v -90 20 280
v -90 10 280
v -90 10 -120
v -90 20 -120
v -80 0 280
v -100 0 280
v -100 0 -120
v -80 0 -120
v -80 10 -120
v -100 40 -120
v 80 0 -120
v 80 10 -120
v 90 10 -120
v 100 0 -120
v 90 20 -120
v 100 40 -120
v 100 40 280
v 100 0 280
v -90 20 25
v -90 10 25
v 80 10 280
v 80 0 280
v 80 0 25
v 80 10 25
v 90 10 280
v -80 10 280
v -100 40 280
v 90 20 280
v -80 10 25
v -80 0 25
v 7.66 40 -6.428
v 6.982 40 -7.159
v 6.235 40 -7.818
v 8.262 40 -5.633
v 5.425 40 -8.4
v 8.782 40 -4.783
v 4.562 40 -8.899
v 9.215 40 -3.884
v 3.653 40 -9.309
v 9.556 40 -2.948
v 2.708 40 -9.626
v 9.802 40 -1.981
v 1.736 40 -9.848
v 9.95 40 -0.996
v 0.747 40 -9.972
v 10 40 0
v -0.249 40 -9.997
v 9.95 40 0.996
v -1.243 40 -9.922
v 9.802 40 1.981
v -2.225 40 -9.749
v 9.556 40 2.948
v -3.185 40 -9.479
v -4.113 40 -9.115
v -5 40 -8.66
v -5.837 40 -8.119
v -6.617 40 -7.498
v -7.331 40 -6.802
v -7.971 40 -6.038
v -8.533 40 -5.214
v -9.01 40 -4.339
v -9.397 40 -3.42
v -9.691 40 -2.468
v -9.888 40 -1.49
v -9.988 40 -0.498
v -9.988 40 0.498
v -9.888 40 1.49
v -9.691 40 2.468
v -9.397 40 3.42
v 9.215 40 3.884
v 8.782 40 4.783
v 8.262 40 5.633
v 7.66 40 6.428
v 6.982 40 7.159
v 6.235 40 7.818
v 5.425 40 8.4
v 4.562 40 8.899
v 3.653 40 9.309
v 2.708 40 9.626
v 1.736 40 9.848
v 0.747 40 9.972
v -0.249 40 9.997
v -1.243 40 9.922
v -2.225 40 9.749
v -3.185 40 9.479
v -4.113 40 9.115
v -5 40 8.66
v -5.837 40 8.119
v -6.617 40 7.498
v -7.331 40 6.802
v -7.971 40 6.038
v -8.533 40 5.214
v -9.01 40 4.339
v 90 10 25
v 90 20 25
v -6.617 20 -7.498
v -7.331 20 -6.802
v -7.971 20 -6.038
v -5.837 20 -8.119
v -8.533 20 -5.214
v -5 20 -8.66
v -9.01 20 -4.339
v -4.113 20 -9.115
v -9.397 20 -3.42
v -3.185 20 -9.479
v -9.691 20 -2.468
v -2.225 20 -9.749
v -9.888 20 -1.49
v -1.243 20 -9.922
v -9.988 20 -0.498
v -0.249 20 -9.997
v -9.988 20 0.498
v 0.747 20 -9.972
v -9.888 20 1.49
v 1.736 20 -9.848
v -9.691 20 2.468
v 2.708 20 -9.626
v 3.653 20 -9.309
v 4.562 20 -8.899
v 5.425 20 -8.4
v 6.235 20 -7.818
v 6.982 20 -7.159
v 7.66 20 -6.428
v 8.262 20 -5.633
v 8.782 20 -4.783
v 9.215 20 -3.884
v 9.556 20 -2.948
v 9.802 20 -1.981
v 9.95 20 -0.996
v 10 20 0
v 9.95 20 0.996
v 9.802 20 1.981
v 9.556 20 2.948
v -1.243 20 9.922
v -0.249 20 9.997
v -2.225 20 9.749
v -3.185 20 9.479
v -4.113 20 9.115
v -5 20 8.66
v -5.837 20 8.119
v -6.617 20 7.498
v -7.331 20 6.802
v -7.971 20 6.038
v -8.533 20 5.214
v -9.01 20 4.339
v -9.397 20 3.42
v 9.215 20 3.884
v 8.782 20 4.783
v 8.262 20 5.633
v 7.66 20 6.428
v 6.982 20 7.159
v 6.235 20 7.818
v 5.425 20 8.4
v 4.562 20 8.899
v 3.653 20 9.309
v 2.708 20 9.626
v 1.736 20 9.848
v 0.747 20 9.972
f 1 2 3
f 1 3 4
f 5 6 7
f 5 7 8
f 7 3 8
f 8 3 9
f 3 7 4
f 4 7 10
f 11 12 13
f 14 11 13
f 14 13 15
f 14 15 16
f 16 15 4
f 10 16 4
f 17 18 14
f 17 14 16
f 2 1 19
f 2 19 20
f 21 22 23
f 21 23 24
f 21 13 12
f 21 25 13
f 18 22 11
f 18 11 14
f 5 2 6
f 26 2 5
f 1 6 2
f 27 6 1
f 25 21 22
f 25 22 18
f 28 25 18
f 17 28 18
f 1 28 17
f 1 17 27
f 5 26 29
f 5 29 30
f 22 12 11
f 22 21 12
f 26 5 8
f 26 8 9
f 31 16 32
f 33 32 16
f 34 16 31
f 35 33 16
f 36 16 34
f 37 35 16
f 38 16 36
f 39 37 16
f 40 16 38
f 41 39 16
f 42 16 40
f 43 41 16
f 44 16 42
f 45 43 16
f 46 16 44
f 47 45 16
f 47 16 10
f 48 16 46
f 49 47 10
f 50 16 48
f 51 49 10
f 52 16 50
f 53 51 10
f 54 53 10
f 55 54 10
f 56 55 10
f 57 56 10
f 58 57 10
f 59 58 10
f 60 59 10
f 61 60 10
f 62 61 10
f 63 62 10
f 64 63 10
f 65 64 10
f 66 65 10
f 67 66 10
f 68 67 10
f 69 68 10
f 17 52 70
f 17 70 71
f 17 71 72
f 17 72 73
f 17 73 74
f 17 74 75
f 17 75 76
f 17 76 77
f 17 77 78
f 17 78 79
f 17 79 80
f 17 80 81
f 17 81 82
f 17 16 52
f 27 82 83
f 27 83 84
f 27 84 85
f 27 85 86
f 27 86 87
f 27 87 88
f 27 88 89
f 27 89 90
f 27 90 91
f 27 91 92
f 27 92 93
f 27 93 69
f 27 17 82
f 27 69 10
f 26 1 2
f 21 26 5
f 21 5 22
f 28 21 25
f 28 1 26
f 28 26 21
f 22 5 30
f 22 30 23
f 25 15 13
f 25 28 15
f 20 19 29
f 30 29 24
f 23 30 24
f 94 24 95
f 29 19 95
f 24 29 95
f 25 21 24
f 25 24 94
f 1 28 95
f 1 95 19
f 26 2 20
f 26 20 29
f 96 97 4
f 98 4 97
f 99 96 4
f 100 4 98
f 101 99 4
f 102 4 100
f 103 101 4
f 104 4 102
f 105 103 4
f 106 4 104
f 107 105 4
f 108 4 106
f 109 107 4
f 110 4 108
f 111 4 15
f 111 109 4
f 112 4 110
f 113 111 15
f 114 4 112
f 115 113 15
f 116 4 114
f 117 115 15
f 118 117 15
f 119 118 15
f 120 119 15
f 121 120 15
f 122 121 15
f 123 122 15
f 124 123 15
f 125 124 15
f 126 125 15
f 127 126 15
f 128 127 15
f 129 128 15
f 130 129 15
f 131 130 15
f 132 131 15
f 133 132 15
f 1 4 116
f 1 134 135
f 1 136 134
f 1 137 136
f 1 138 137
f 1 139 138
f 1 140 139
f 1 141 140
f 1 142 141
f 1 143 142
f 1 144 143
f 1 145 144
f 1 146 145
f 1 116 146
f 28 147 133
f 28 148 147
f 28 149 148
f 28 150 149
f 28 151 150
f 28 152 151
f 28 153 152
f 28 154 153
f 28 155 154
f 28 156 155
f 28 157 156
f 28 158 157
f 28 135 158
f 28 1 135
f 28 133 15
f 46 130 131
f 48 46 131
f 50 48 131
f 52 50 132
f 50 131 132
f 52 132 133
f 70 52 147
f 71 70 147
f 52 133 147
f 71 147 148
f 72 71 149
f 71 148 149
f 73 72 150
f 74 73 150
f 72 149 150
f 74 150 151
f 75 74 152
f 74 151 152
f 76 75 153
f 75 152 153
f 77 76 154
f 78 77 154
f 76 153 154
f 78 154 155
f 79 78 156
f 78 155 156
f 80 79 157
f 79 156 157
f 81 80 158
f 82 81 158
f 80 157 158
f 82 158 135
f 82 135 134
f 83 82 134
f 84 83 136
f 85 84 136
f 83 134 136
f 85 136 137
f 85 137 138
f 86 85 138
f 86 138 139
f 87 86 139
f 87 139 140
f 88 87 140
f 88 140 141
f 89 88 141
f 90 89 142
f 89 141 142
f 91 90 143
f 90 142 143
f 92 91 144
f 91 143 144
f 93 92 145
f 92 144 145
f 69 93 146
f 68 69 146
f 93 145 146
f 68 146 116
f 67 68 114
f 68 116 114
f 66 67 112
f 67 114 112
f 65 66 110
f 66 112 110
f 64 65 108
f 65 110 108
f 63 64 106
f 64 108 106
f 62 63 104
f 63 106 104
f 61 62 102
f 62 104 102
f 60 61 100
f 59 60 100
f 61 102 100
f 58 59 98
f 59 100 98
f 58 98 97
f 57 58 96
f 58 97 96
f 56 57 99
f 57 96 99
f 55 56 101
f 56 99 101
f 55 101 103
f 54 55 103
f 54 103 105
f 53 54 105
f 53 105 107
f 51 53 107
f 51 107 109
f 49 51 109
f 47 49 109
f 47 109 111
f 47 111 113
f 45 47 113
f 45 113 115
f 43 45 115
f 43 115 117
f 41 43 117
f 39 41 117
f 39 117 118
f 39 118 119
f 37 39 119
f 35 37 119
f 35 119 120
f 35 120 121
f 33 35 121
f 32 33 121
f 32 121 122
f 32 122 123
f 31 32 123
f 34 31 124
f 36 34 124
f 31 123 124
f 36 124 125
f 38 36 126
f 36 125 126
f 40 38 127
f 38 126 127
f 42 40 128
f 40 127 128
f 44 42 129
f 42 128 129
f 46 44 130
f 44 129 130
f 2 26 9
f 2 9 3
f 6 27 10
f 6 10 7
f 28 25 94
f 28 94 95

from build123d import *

# Parameters (mm, degrees)
F1_DEPTH      = 280
F1_DEPTH_BACK = 120
F2_R          = 10
F3_DEPTH      = 20
F5_DEPTH      = 255


with BuildPart() as f1:
    # F0 (on Top) → F1 (new body, two sides)
    with BuildSketch(Plane.XY) as f1_sk:
        Polygon((80, 10), (80, 0), (100, 0), (100, 40), (0, 40), (0, 20), (90, 20), (90, 10), align=None)
        Polygon((0, 20), (0, 40), (-100, 40), (-100, 0), (-80, 0), (-80, 10), (-90, 10), (-90, 20), align=None)
    extrude(amount=F1_DEPTH)
    extrude(f1_sk.sketch, amount=-F1_DEPTH_BACK)

    # F2 (on face) → F3 (cut)
    with BuildSketch(Plane.XZ.offset(-20)):
        Circle(F2_R)
    extrude(amount=-F3_DEPTH, mode=Mode.SUBTRACT)


with BuildPart() as f5:
    # F4 (on face) → F5 (new body)
    with BuildSketch(Plane.XY.offset(280)):
        Polygon((90, 20), (-90, 20), (-90, 10), (-80, 10), (-80, 0), (80, 0), (80, 10), (90, 10), align=None)
    extrude(amount=-F5_DEPTH)


solid = Compound([f1.part, f5.part])
